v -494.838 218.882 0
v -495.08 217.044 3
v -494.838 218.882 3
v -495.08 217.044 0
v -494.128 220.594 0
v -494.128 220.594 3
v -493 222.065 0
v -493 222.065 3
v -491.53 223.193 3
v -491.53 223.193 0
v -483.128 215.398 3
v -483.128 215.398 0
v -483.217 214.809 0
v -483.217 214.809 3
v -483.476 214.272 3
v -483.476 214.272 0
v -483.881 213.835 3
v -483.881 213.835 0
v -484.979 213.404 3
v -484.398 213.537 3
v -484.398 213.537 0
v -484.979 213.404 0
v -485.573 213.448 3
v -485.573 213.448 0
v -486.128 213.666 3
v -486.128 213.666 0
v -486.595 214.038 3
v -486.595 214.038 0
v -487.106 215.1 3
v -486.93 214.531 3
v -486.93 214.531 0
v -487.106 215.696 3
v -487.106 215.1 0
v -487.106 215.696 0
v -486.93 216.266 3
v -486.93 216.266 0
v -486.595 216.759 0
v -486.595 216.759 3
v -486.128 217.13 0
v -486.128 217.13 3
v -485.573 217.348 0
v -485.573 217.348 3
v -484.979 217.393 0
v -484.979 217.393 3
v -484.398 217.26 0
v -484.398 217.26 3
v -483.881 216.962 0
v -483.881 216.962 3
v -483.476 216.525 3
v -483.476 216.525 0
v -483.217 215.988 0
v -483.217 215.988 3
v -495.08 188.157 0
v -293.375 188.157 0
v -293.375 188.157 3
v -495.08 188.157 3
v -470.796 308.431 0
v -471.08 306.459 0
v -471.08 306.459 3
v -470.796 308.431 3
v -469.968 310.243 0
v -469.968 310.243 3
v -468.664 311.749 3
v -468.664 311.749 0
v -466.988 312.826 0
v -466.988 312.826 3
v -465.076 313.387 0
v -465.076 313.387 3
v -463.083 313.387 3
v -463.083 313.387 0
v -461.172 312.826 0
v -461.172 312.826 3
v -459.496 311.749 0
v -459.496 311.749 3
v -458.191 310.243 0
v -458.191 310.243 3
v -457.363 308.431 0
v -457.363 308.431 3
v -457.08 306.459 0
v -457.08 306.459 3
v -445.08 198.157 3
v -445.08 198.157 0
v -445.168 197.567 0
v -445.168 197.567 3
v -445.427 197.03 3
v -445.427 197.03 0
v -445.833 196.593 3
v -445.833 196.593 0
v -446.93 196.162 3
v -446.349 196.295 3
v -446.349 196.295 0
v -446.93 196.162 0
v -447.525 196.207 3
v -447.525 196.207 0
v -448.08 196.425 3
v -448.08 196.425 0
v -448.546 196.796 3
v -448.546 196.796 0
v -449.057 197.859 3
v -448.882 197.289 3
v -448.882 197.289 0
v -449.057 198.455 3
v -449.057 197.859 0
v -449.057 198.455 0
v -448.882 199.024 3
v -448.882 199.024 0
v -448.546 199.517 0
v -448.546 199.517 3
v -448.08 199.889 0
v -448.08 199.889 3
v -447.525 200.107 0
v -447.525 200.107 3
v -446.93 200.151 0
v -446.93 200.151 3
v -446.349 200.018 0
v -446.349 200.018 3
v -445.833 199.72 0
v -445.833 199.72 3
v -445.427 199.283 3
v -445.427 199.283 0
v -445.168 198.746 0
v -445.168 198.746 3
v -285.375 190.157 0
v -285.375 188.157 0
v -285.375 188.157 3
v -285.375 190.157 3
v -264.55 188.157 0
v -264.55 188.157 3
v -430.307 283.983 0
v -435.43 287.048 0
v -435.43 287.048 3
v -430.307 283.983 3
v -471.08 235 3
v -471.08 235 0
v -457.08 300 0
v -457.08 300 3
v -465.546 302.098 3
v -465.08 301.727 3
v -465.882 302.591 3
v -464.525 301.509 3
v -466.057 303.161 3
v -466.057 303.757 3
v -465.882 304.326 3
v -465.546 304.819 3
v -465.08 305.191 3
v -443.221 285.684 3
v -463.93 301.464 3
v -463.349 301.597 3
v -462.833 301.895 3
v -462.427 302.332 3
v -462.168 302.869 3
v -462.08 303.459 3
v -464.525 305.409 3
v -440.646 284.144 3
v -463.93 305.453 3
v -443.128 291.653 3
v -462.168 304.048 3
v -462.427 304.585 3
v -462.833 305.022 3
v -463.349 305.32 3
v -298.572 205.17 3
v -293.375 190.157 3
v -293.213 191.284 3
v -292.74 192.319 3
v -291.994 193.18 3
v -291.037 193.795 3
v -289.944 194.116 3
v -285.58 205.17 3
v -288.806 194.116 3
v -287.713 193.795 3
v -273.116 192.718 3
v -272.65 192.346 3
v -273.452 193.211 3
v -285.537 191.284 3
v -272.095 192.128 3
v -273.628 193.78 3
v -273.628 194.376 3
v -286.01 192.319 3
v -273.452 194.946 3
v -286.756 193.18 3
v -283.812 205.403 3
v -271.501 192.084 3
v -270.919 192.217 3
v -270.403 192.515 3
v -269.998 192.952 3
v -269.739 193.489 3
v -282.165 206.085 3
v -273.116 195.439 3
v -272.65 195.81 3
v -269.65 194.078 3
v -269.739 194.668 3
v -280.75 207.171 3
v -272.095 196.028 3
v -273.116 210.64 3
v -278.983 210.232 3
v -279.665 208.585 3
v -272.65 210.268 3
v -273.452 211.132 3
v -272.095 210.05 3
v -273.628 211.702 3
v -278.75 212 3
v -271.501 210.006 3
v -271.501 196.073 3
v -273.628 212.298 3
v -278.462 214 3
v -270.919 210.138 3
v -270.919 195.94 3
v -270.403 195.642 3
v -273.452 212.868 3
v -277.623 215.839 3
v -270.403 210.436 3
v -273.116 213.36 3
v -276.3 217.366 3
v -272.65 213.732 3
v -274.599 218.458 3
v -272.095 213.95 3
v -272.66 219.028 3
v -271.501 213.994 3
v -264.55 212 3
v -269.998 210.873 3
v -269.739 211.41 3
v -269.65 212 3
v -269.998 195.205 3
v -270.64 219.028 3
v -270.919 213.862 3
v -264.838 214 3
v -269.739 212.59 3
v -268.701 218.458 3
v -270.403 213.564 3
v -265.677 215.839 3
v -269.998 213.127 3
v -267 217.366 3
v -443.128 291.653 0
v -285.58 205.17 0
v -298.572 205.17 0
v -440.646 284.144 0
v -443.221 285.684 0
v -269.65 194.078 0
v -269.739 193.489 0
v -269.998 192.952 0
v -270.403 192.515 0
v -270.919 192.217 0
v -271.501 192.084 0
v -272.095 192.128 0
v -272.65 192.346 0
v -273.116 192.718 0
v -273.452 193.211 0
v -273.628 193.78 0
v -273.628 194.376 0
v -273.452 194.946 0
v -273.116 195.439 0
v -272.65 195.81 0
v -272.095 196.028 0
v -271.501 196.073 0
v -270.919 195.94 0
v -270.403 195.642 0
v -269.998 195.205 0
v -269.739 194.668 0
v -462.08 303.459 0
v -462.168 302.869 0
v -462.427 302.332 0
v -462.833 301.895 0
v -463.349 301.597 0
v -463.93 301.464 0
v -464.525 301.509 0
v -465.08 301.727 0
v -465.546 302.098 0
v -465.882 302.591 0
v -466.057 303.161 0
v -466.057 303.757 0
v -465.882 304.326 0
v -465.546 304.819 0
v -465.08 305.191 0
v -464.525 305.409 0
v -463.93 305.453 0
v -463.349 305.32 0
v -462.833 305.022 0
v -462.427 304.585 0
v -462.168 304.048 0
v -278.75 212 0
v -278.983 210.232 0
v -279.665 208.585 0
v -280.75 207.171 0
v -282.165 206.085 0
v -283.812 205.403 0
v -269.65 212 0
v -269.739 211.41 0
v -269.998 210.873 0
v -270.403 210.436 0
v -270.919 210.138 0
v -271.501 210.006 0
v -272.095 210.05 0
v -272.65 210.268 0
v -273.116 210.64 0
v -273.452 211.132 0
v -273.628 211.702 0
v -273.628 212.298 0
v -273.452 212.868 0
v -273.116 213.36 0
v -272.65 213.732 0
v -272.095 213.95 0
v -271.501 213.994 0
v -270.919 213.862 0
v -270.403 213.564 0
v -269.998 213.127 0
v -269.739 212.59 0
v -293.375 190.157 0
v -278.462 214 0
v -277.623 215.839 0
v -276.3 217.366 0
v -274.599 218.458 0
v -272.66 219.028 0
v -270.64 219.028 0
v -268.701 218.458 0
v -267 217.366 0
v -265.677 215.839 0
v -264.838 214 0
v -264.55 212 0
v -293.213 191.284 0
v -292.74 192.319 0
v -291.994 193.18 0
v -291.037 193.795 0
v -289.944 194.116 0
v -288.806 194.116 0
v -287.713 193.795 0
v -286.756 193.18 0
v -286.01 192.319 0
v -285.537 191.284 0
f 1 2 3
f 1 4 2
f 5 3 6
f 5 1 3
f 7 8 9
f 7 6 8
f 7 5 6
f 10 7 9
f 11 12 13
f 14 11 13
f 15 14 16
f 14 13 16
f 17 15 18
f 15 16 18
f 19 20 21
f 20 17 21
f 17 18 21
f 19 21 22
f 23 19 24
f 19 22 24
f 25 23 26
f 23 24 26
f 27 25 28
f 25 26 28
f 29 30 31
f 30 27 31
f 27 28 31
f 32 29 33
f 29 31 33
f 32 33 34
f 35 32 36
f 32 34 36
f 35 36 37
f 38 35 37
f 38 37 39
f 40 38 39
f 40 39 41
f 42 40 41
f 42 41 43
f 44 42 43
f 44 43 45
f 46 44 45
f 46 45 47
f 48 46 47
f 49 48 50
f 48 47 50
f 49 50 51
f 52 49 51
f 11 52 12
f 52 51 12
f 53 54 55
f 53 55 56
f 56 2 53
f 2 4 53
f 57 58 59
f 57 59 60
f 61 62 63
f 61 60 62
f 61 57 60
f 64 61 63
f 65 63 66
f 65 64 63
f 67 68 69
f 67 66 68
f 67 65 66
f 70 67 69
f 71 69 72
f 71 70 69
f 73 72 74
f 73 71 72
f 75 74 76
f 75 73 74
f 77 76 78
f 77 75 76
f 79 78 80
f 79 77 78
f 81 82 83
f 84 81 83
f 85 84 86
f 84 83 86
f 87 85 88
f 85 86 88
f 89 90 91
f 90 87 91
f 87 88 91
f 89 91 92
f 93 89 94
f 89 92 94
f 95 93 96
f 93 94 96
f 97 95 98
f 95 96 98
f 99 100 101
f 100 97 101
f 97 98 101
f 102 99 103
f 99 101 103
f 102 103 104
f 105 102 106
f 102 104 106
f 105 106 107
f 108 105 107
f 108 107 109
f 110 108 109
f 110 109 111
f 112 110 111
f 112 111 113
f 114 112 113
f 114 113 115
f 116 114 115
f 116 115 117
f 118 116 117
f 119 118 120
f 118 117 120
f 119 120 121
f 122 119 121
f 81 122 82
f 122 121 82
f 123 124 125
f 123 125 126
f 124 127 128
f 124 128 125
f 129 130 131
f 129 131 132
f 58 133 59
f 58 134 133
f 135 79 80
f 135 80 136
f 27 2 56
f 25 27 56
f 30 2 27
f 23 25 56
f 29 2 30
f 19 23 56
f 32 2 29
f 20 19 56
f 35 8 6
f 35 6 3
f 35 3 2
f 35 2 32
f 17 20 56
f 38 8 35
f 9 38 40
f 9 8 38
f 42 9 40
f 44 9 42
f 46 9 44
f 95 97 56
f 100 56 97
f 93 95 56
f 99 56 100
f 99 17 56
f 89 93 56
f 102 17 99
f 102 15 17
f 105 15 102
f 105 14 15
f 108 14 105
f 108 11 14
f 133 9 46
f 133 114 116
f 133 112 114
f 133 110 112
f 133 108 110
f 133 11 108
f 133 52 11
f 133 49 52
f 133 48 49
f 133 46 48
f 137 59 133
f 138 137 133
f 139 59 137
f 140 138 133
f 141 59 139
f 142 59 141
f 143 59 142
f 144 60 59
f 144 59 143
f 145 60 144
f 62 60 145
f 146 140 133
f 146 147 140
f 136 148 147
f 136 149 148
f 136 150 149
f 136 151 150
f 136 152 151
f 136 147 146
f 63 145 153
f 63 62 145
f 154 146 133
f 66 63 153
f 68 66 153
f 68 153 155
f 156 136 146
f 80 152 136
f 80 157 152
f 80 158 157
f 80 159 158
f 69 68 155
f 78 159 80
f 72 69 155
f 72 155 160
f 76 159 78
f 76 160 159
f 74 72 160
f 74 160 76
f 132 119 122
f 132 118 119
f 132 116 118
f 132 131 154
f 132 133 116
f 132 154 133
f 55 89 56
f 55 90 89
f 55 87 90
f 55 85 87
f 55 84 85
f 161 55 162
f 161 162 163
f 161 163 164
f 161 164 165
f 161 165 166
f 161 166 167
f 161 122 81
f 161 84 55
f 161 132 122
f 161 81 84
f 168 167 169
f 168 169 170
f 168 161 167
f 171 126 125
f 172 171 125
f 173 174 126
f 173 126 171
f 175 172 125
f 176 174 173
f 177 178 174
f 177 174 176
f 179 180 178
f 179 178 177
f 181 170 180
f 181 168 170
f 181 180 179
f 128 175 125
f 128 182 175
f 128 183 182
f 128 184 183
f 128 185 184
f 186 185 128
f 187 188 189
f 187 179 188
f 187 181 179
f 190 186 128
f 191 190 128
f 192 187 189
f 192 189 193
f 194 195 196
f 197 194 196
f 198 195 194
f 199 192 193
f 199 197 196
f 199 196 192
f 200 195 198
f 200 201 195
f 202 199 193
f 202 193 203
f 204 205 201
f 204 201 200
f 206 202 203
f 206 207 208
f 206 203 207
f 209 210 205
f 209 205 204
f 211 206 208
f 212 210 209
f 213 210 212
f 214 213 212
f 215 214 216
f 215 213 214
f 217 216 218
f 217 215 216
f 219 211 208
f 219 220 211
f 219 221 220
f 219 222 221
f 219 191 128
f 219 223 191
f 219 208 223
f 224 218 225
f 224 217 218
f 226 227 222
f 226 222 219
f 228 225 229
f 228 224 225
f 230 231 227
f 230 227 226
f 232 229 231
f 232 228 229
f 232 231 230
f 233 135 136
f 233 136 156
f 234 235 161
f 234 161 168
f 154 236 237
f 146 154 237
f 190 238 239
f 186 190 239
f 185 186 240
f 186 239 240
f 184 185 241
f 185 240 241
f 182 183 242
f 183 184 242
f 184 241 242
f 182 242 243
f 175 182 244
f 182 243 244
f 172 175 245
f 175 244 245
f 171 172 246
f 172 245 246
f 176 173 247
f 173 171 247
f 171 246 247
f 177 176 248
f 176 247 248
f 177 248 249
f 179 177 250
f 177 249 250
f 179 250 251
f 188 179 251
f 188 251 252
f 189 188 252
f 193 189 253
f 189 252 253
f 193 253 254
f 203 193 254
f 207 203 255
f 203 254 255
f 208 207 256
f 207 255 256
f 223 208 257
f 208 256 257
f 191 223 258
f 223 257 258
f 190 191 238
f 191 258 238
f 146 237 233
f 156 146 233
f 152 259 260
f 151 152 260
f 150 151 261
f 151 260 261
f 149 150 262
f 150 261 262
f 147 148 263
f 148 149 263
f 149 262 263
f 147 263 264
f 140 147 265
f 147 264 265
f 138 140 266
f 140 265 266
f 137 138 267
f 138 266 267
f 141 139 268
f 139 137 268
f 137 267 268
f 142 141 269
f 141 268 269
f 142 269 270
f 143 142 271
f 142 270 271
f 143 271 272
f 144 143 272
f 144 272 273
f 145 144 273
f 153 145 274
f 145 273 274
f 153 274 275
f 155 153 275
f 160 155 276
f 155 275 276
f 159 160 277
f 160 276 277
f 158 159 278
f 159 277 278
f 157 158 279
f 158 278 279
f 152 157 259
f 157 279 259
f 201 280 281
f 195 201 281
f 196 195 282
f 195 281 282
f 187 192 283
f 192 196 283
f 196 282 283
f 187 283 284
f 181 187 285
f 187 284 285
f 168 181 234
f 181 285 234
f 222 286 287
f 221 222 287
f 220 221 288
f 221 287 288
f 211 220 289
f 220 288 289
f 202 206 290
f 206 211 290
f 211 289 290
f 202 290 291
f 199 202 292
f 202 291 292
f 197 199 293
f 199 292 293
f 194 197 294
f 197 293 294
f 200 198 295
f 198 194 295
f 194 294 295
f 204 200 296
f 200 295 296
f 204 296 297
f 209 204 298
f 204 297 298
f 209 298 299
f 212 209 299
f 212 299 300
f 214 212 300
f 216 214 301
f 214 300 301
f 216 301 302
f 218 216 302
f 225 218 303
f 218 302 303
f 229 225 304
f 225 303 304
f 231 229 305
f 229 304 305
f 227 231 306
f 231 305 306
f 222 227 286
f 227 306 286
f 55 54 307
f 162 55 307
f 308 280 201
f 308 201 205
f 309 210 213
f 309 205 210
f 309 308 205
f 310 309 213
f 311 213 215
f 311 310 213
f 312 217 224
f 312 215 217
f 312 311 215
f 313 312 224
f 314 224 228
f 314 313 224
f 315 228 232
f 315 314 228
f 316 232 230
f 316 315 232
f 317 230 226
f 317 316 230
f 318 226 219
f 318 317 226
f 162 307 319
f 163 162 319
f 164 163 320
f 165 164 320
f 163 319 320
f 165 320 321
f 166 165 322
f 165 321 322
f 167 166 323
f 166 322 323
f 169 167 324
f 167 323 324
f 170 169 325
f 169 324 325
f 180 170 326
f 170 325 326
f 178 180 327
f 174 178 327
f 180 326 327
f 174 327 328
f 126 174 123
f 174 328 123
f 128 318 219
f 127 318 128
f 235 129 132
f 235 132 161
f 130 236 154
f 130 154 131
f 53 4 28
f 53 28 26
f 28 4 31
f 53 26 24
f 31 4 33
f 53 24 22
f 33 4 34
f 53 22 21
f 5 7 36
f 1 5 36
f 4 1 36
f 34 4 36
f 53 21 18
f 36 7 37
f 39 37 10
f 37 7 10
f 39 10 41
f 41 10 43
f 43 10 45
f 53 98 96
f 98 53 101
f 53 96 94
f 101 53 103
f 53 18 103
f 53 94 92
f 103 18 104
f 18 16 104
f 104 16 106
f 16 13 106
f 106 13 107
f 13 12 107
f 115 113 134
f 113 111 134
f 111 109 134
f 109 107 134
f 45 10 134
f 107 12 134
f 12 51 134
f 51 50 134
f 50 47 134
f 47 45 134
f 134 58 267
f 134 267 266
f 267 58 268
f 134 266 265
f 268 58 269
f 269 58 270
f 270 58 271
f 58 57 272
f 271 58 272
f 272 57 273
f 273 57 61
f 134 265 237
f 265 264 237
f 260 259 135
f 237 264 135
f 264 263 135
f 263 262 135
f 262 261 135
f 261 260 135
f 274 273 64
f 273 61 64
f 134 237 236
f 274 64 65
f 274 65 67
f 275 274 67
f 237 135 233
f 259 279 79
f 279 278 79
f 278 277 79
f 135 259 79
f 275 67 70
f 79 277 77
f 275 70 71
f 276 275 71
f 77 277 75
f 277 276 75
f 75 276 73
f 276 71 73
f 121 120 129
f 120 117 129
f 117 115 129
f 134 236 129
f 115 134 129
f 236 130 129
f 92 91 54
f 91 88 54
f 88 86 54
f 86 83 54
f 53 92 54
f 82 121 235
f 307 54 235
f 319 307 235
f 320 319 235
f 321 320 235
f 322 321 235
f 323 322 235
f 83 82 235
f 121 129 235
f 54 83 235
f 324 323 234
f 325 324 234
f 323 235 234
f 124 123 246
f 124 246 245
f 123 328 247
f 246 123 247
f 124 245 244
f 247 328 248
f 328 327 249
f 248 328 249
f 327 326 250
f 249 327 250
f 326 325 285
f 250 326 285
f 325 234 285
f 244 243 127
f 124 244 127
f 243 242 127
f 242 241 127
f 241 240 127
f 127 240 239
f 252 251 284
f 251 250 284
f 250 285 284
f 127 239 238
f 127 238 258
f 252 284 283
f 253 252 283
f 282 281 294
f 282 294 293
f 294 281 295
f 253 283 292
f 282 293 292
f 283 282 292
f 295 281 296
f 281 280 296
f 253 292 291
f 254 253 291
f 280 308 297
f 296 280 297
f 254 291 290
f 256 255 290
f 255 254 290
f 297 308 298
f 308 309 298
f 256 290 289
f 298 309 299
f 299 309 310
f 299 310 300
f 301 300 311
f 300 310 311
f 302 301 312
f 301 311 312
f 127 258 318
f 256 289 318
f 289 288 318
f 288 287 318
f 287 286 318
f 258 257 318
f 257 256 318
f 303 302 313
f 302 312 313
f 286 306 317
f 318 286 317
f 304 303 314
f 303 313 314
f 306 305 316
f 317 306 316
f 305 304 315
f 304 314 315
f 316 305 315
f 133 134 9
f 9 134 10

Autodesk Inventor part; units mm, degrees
ref_plane "YZ Plane" through (0, 0, 0) normal (1, 0, 0) x (0, 1, 0)
ref_plane "XZ Plane" through (0, 0, 0) normal (0, 1, 0) x (-1, 0, 0)
ref_plane "XY Plane" through (0, 0, 0) normal (0, 0, 1) x (1, 0, 0)
sketch "Sketch3" plane through (0, 0, 0) normal (0, 0, 1) x (1, 0, 0)
  circle A0 centre (367.816, 50) radius 50 construction
  line L0 (367.816, 0) -> (512.7041, 0) construction
  line L1 (367.816, 50) -> (512.7041, 50) construction
  line L2 (367.816, 100) -> (512.7041, 100) construction
  line L3 (367.816, 50) -> (342.816, 6.6987) construction
  line L4 (367.816, 50) -> (324.5147, 25) construction
  line L5 (367.816, 50) -> (324.5147, 75) construction
  line L6 (342.816, 93.3013) -> (367.816, 50) construction
  line L7 (392.816, 93.3013) -> (367.816, 50) construction
  line L8 (411.1173, 75) -> (367.816, 50) construction
  line L9 (411.1173, 25) -> (367.816, 50) construction
  line L10 (392.816, 6.6987) -> (367.816, 50) construction
  line L11 (367.816, 0) -> (367.816, 100) construction
  line L12 (417.816, 50) -> (367.816, 50) construction
  line L13 (341.6361, 0) -> (341.6361, 100) construction
  line L14 (315.4561, 0) -> (315.4561, 100) construction
  line L15 (289.2762, 0) -> (289.2762, 100) construction
  line L16 (263.0963, 0) -> (263.0963, 100) construction
  line L17 (236.9163, 0) -> (236.9163, 100) construction
  line L18 (210.7364, 0) -> (210.7364, 100) construction
  line L19 (184.5564, 0) -> (184.5564, 100) construction
  line L20 (158.3765, 0) -> (158.3765, 100) construction
  circle A1 centre (315.4561, 50) radius 50 construction
  circle A2 centre (341.6361, 50) radius 50 construction
  circle A3 centre (289.2762, 50) radius 50 construction
  circle A4 centre (263.0963, 50) radius 50 construction
  circle A5 centre (236.9163, 50) radius 50 construction
  circle A6 centre (210.7364, 50) radius 50 construction
  line L21 (392.816, 6.6987) -> (512.7041, 6.6987) construction
  line L22 (411.1173, 25) -> (512.7041, 25) construction
  line L23 (411.1173, 75) -> (512.7041, 75) construction
  line L24 (411.1173, 75) -> (512.7041, 75) construction
  line L25 (392.816, 93.3013) -> (512.7041, 93.3013) construction
  line L26 (358.7574, 75) -> (339.2762, 50) construction
  line L27 (339.2762, 50) -> (306.3975, 25) construction
  line L28 (306.3975, 25) -> (261.9163, 6.6987) construction
  line L29 (261.9163, 6.6987) -> (210.7364, 0) construction
  line L30 (105.3682, -12.9392) -> (105.3682, 124.4333) construction
  line L31 (21.25, 0) -> (21.25, 12)
  line L32 (35.45, 12) -> (35.45, -11.8433)
  arc A7 (0, 0) -> (6.625, -9.8433) centre (10.625, 0) ccw
  arc A8 (14.625, -9.8433) -> (21.25, 0) centre (10.625, 0) ccw
  line L33 (35.45, -11.8433) -> (14.625, -11.8433)
  line L34 (6.625, -11.8433) -> (-195.0796, -11.8433)
  circle A9 centre (-144.26, 100.8473) radius 12.875 construction
  line L35 (6.625, -11.8433) -> (6.625, -9.8433)
  line L36 (14.625, -11.8433) -> (14.625, -9.8433)
  line L37 (411.1173, 75) -> (158.3765, 75) construction
  line L38 (367.816, 100) -> (158.3765, 100) construction
  line L39 (417.816, 50) -> (158.3765, 50) construction
  line L40 (411.1173, 25) -> (158.3765, 25) construction
  line L41 (392.816, 6.6987) -> (158.3765, 6.6987) construction
  line L42 (392.816, 93.3013) -> (158.3765, 93.3013) construction
  line L43 (358.7574, 75) -> (366.6361, 93.3013) construction
  line L44 (366.6361, 93.3013) -> (367.816, 100) construction
  spline S0 degree 4 poles (-157.0796, 100) (-157.0796, 88.9946) (-147.011, 72.6811) (-131.8577, 48.7932) (-88.4777, 17.6268) (-50.0176, 3.937) (-18.8717, 0) (0, 0) knots 0 0 0 0 0 0.264547 0.457223 0.66608 1 1 1 1 1
  line L45 (-157.0796, 100) -> (-157.0796, 38) construction
  line L46 (0, 0) -> (-157.0796, 0) construction
  line L47 (-144.26, 100.8473) -> (-157.135, 100.8473) construction
  circle A10 centre (-146.4546, 100) radius 10.625 construction
  line L48 (-146.4546, 100) -> (-157.0796, 100) construction
  line L49 (-141.0754, 84.4005) -> (-135.6205, 93.5183) construction
  line L50 (-141.0796, 132.0528) -> (-171.0796, 149.3733) construction
  line L51 (-171.0796, 149.3733) -> (-201.0796, 132.0528) construction
  line L52 (-141.0754, 84.4005) -> (-99.2801, 84.4005) construction
  line L53 (-201.0796, 132.0528) -> (-201.0796, 97.4118) construction
  line L54 (-201.0796, 97.4118) -> (-171.0796, 80.0913) construction
  line L55 (0, 0) -> (-157.0796, 93.9753) construction
  line L56 (-135.6205, 93.5183) -> (-137.3368, 94.5451) construction
  line L57 (-137.3368, 94.5451) -> (-143.2815, 84.6085) construction
  line L58 (-137.3368, 94.5451) -> (-171.0796, 114.7323) construction
  line L59 (-201.0796, 132.0528) -> (-171.0796, 114.7323) construction
  arc A11 (-137.3368, 94.5451) -> (-144.7045, 143.8948) centre (-171.0796, 114.7323) ccw construction
  arc A12 (-142.7917, 85.4273) -> (-147.1443, 147.6882) centre (-171.0796, 114.7323) ccw construction
  line L60 (-171.0796, 80.0913) -> (-171.0796, 35)
  circle A13 centre (-171.0796, 114.7323) radius 2.5 construction
  arc A14 (-167.4345, 120.8251) -> (-174.7248, 108.6394) centre (-171.0796, 114.7323) ccw construction
  line L61 (-167.4345, 120.8251) -> (-157.0796, 114.6302) construction
  line L62 (-171.0796, 80.0913) -> (-171.0796, 106.4587)
  line L63 (-171.0796, 106.4587) -> (-174.7248, 108.6394) construction
  line L64 (-171.0796, 35) -> (-191.5296, 23.1932)
  arc A15 (-191.5296, 23.1932) -> (-195.0796, 17.0444) centre (-187.9796, 17.0444) ccw
  line L65 (-195.0796, 17.0444) -> (-195.0796, -11.8433)
  arc A16 (35.45, 12) -> (21.25, 12) centre (28.35, 12) ccw
  line L66 (-157.0796, 114.6302) -> (-157.0796, 99.9865) construction
  circle A17 centre (-164.0796, 103.4587) radius 2
  line L67 (-171.0796, 103.4587) -> (-157.0796, 103.4587) construction
  circle A18 centre (-185.1284, 15.3983) radius 2
  line L68 (-185.1284, 15.3983) -> (-194.1284, 20.5944) construction
  circle A19 centre (-6, -5.9217) radius 2
  line L69 (-6, -11.8433) -> (-6, 0) construction
  circle A20 centre (28.35, 12) radius 2
  circle A21 centre (28.35, -5.9217) radius 2
  line L70 (-167.4345, 320.8251) -> (-157.0796, 314.6302) construction
  arc A22 (-167.4345, 320.8251) -> (-174.7248, 308.6394) centre (-171.0796, 314.7323) ccw construction
  circle A23 centre (-171.0796, 314.7323) radius 2.5 construction
  line L71 (-171.0796, 280.0913) -> (-171.0796, 306.4587)
  line L72 (-171.0796, 306.4587) -> (-174.7248, 308.6394) construction
  line L73 (-157.0796, 314.6302) -> (-157.0796, 299.9865) construction
  circle A24 centre (-164.0796, 303.4587) radius 2
  spline S1 degree 4 poles (-157.0796, 300) (-157.0796, 288.9946) (-147.0234, 272.6841) (-124.1789, 236.7977) (-70.8039, 208.0704) (-31.8865, 200.2943) (0, 200) knots 0 0 0 0 0 0.264547 0.457223 1 1 1 1 1 construction
  line L74 (-157.0796, 300) -> (-157.0796, 238) construction
  arc A25 (0, 200) -> (6.625, 190.1567) centre (10.625, 200) ccw
  line L75 (35.45, 212) -> (35.45, 188.1567)
  circle A26 centre (28.35, 212) radius 2
  circle A27 centre (28.35, 194.0783) radius 2
  arc A28 (35.45, 212) -> (21.25, 212) centre (28.35, 212) ccw
  line L76 (21.25, 200) -> (21.25, 212)
  line L77 (35.45, 188.1567) -> (14.625, 188.1567)
  arc A29 (14.625, 190.1567) -> (21.25, 200) centre (10.625, 200) ccw
  line L78 (14.625, 188.1567) -> (14.625, 190.1567)
  line L79 (-185.1284, 215.3983) -> (-194.1284, 220.5944) construction
  arc A30 (-191.5296, 223.1932) -> (-195.0796, 217.0444) centre (-187.9796, 217.0444) ccw
  line L80 (-195.0796, 217.0444) -> (-195.0796, 188.1567)
  line L81 (-171.0796, 235) -> (-191.5296, 223.1932)
  circle A31 centre (-185.1284, 215.3983) radius 2
  line L82 (-171.0796, 280.0913) -> (-171.0796, 235)
  line L83 (6.625, 188.1567) -> (-195.0796, 188.1567)
  line L84 (6.625, 188.1567) -> (6.625, 190.1567)
  line L85 (-137.3368, 294.5451) -> (-143.2815, 284.6085) construction
  line L86 (-141.0754, 284.4005) -> (-135.6205, 293.5183) construction
  line L87 (0, 200) -> (-157.0796, 293.9753)
  line L88 (-167.4345, 520.8251) -> (-157.0796, 514.6302) construction
  arc A32 (-167.4345, 520.8251) -> (-174.7248, 508.6394) centre (-171.0796, 514.7323) ccw construction
  circle A33 centre (-171.0796, 514.7323) radius 2.5 construction
  line L89 (-171.0796, 480.0913) -> (-171.0796, 506.4587)
  line L90 (-171.0796, 506.4587) -> (-174.7248, 508.6394) construction
  line L91 (-157.0796, 514.6302) -> (-157.0796, 499.9865) construction
  circle A34 centre (-164.0796, 503.4587) radius 2
  spline S2 degree 4 poles (-157.0796, 500) (-157.0796, 488.9946) (-147.0234, 472.6841) (-124.1789, 436.7977) (-70.8039, 408.0704) (-31.8865, 400.2943) (0, 400) knots 0 0 0 0 0 0.264547 0.457223 1 1 1 1 1 construction
  line L92 (-157.0796, 500) -> (-157.0796, 438)
  arc A35 (0, 400) -> (6.625, 390.1567) centre (10.625, 400) ccw
  line L93 (35.45, 412) -> (35.45, 388.1567)
  circle A36 centre (28.35, 412) radius 2
  circle A37 centre (28.35, 394.0783) radius 2
  arc A38 (35.45, 412) -> (21.25, 412) centre (28.35, 412) ccw
  line L94 (21.25, 400) -> (21.25, 412)
  line L95 (35.45, 388.1567) -> (14.625, 388.1567)
  arc A39 (14.625, 390.1567) -> (21.25, 400) centre (10.625, 400) ccw
  line L96 (14.625, 388.1567) -> (14.625, 390.1567)
  line L97 (-185.1284, 415.3983) -> (-194.1284, 420.5944) construction
  arc A40 (-191.5296, 423.1932) -> (-195.0796, 417.0444) centre (-187.9796, 417.0444) ccw
  line L98 (-195.0796, 417.0444) -> (-195.0796, 388.1567)
  line L99 (-171.0796, 435) -> (-191.5296, 423.1932)
  circle A41 centre (-185.1284, 415.3983) radius 2
  line L100 (-171.0796, 480.0913) -> (-171.0796, 435)
  line L101 (6.625, 388.1567) -> (-195.0796, 388.1567)
  line L102 (6.625, 388.1567) -> (6.625, 390.1567)
  line L103 (-137.3368, 494.5451) -> (-143.2815, 484.6085) construction
  line L104 (-141.0754, 484.4005) -> (-135.6205, 493.5183) construction
  line L105 (0, 400) -> (-157.0796, 493.9753) construction
  line L106 (-467.4345, 120.8251) -> (-457.0796, 114.6302) construction
  arc A42 (-467.4345, 120.8251) -> (-474.7248, 108.6394) centre (-471.0796, 114.7323) ccw construction
  circle A43 centre (-471.0796, 114.7323) radius 2.5 construction
  line L107 (-471.0796, 80.0913) -> (-471.0796, 106.4587)
  line L108 (-471.0796, 106.4587) -> (-474.7248, 108.6394) construction
  line L109 (-457.0796, 114.6302) -> (-457.0796, 99.9865) construction
  circle A44 centre (-464.0796, 103.4587) radius 2
  spline S3 degree 4 poles (-457.0796, 100) (-457.0796, 88.9946) (-447.0234, 72.6841) (-424.1789, 36.7977) (-370.8039, 8.0704) (-331.8865, 0.2943) (-300, 0) knots 0 0 0 0 0 0.264547 0.457223 1 1 1 1 1 construction
  line L110 (-457.0796, 100) -> (-457.0796, 38) construction
  arc A45 (-300, 0) -> (-293.375, -9.8433) centre (-289.375, 0) ccw construction
  line L111 (-264.55, 12) -> (-264.55, -11.8433)
  circle A46 centre (-271.65, 12) radius 2
  circle A47 centre (-271.65, -5.9217) radius 2
  arc A48 (-264.55, 12) -> (-278.75, 12) centre (-271.65, 12) ccw
  line L112 (-278.75, 0) -> (-278.75, 12) construction
  line L113 (-264.55, -11.8433) -> (-285.375, -11.8433)
  arc A49 (-285.375, -9.8433) -> (-278.75, 0) centre (-289.375, 0) ccw construction
  line L114 (-285.375, -11.8433) -> (-285.375, -9.8433) construction
  line L115 (-485.1284, 15.3983) -> (-494.1284, 20.5944) construction
  arc A50 (-491.5296, 23.1932) -> (-495.0796, 17.0444) centre (-487.9796, 17.0444) ccw
  line L116 (-495.0796, 17.0444) -> (-495.0796, -11.8433)
  line L117 (-471.0796, 35) -> (-491.5296, 23.1932)
  circle A51 centre (-485.1284, 15.3983) radius 2
  line L118 (-471.0796, 80.0913) -> (-471.0796, 35)
  line L119 (-293.375, -11.8433) -> (-495.0796, -11.8433)
  line L120 (-293.375, -11.8433) -> (-293.375, -9.8433) construction
  line L121 (-437.3368, 94.5451) -> (-443.2815, 84.6085) construction
  line L122 (-441.0754, 84.4005) -> (-435.6205, 93.5183) construction
  line L123 (-300, 0) -> (-457.0796, 93.9753) construction
  line L124 (-467.4345, 320.8251) -> (-457.0796, 314.6302) construction
  arc A52 (-467.4345, 320.8251) -> (-474.7248, 308.6394) centre (-471.0796, 314.7323) ccw construction
  circle A53 centre (-471.0796, 314.7323) radius 2.5 construction
  line L125 (-471.0796, 280.0913) -> (-471.0796, 306.4587)
  line L126 (-471.0796, 306.4587) -> (-474.7248, 308.6394) construction
  line L127 (-457.0796, 314.6302) -> (-457.0796, 299.9865) construction
  circle A54 centre (-464.0796, 303.4587) radius 2
  spline S4 degree 4 poles (-457.0796, 300) (-457.0796, 288.9946) (-447.0234, 272.6841) (-424.1789, 236.7977) (-370.8039, 208.0704) (-331.8865, 200.2943) (-300, 200) knots 0 0 0 0 0 0.264547 0.457223 1 1 1 1 1 construction
  line L128 (-457.0796, 300) -> (-457.0796, 238) construction
  arc A55 (-300, 200) -> (-293.375, 190.1567) centre (-289.375, 200) ccw construction
  line L129 (-264.55, 212) -> (-264.55, 188.1567)
  circle A56 centre (-271.65, 212) radius 2
  circle A57 centre (-271.65, 194.0783) radius 2
  arc A58 (-264.55, 212) -> (-278.75, 212) centre (-271.65, 212) ccw
  line L130 (-278.75, 200) -> (-278.75, 212) construction
  line L131 (-264.55, 188.1567) -> (-285.375, 188.1567)
  arc A59 (-285.375, 190.1567) -> (-278.75, 200) centre (-289.375, 200) ccw construction
  line L132 (-285.375, 188.1567) -> (-285.375, 190.1567) construction
  line L133 (-485.1284, 215.3983) -> (-494.1284, 220.5944) construction
  arc A60 (-491.5296, 223.1932) -> (-495.0796, 217.0444) centre (-487.9796, 217.0444) ccw
  line L134 (-495.0796, 217.0444) -> (-495.0796, 188.1567)
  line L135 (-471.0796, 235) -> (-491.5296, 223.1932)
  circle A61 centre (-485.1284, 215.3983) radius 2
  line L136 (-471.0796, 280.0913) -> (-471.0796, 235)
  line L137 (-293.375, 188.1567) -> (-495.0796, 188.1567)
  line L138 (-293.375, 188.1567) -> (-293.375, 190.1567) construction
  line L139 (-437.3368, 294.5451) -> (-443.2815, 284.6085) construction
  line L140 (-441.0754, 284.4005) -> (-435.6205, 293.5183) construction
  line L141 (-300, 200) -> (-457.0796, 293.9753) construction
  line L142 (-467.4345, 520.8251) -> (-457.0796, 514.6302)
  arc A62 (-467.4345, 520.8251) -> (-474.7248, 508.6394) centre (-471.0796, 514.7323) ccw
  circle A63 centre (-471.0796, 514.7323) radius 2.5
  line L143 (-471.0796, 480.0913) -> (-471.0796, 506.4587)
  line L144 (-471.0796, 506.4587) -> (-474.7248, 508.6394)
  line L145 (-457.0796, 514.6302) -> (-457.0796, 499.9865)
  circle A64 centre (-464.0796, 503.4587) radius 2
  spline S5 degree 4 poles (-457.0796, 500) (-457.0796, 488.9946) (-447.0234, 472.6841) (-424.1789, 436.7977) (-370.8039, 408.0704) (-331.8865, 400.2943) (-300, 400) knots 0 0 0 0 0 0.264547 0.457223 1 1 1 1 1 construction
  line L146 (-457.0796, 500) -> (-457.0796, 438) construction
  arc A65 (-300, 400) -> (-293.375, 390.1567) centre (-289.375, 400) ccw construction
  line L147 (-264.55, 412) -> (-264.55, 388.1567) construction
  circle A66 centre (-271.65, 412) radius 2
  circle A67 centre (-271.65, 394.0783) radius 2
  arc A68 (-264.55, 412) -> (-278.75, 412) centre (-271.65, 412) ccw
  line L148 (-278.75, 400) -> (-278.75, 412) construction
  line L149 (-264.55, 388.1567) -> (-285.375, 388.1567)
  arc A69 (-285.375, 390.1567) -> (-278.75, 400) centre (-289.375, 400) ccw construction
  line L150 (-285.375, 388.1567) -> (-285.375, 390.1567) construction
  line L151 (-485.1284, 415.3983) -> (-494.1284, 420.5944) construction
  arc A70 (-491.5296, 423.1932) -> (-495.0796, 417.0444) centre (-487.9796, 417.0444) ccw
  line L152 (-495.0796, 417.0444) -> (-495.0796, 388.1567) construction
  line L153 (-471.0796, 435) -> (-491.5296, 423.1932)
  circle A71 centre (-485.1284, 415.3983) radius 2
  line L154 (-471.0796, 480.0913) -> (-471.0796, 435)
  line L155 (-293.375, 388.1567) -> (-495.0796, 388.1567)
  line L156 (-293.375, 388.1567) -> (-293.375, 390.1567) construction
  line L157 (-437.3368, 494.5451) -> (-443.2815, 484.6085) construction
  line L158 (-441.0754, 484.4005) -> (-435.6205, 493.5183) construction
  line L159 (-300, 400) -> (-457.0796, 493.9753) construction
  line L160 (-435.4304, 87.048) -> (-430.3073, 83.9831)
  line L161 (-430.3073, 83.9831) -> (-430.3073, 78.0131)
  line L162 (-457.0796, 100) -> (-443.128, 91.6532)
  line L163 (-443.2208, 85.684) -> (-443.128, 91.6532)
  line L164 (-440.6463, 84.1438) -> (-435.4304, 87.048)
  line L165 (-440.6463, 84.1438) -> (-443.2208, 85.684)
  line L166 (-430.3073, 78.0131) -> (-436.0283, 74.7101)
  line L167 (-436.0283, 74.7101) -> (-436.0283, 68.1041)
  spline S6 degree 4 poles (-439.3753, 72.7777) (-420.1522, 45.3403) (-398.6357, 22.4496) (-337.1208, 4.2654) (-300, 5.1701) knots 0 0 0 0 0 1 1 1 1 1
  line L168 (-293.375, -11.8433) -> (-285.375, -11.8433)
  line L169 (-157.0796, 293.9753) -> (-157.0796, 300)
  line L170 (-293.375, 188.1567) -> (-285.375, 188.1567)
  arc A72 (-157.0796, 438) -> (-119.0796, 400) centre (-119.0796, 438) ccw
  line L171 (-119.0796, 400) -> (0, 400)
  line L172 (-457.0796, 500) -> (-457.0796, 438) construction
  line L173 (-419.0796, 400) -> (-300, 400) construction
  arc A73 (-457.0796, 438) -> (-419.0796, 400) centre (-419.0796, 438) ccw construction
  line L174 (-457.0796, 300) -> (-443.128, 291.6532)
  line L175 (-443.2208, 285.684) -> (-443.128, 291.6532)
  line L176 (-440.6463, 284.1438) -> (-443.2208, 285.684)
  line L177 (-440.6463, 284.1438) -> (-435.4304, 287.048)
  line L178 (-435.4304, 287.048) -> (-430.3073, 283.9831)
  line L179 (-430.3073, 283.9831) -> (-430.3073, 278.0131) construction
  line L180 (-430.3073, 278.0131) -> (-436.0283, 274.7101) construction
  line L181 (-457.0796, 500) -> (-443.128, 491.6532)
  line L182 (-443.2208, 485.684) -> (-443.128, 491.6532)
  line L183 (-440.6463, 484.1438) -> (-443.2208, 485.684)
  line L184 (-440.6463, 484.1438) -> (-435.4304, 487.048)
  line L185 (-435.4304, 487.048) -> (-430.3073, 483.9831)
  line L186 (-430.3073, 483.9831) -> (-430.3073, 478.0131)
  line L187 (-430.3073, 478.0131) -> (-436.0283, 474.7101)
  line L188 (-430.3073, 283.9831) -> (-298.5715, 205.1701)
  line L189 (-293.375, 388.1567) -> (-285.375, 388.1567)
  line L190 (-300, 5.1701) -> (-285.5799, 5.1701)
  arc A74 (-285.5799, 5.1701) -> (-278.75, 12) centre (-285.5799, 12) ccw
  line L191 (-298.5715, 205.1701) -> (-285.5799, 205.1701)
  arc A75 (-285.5799, 205.1701) -> (-278.75, 212) centre (-285.5799, 212) ccw
  line L192 (-436.0283, 474.7101) -> (-451.9095, 465.5411)
  line L193 (-451.9095, 465.5411) -> (-451.9095, 438)
  arc A76 (-451.9095, 438) -> (-419.0796, 405.1701) centre (-419.0796, 438) ccw
  line L194 (-419.0796, 405.1701) -> (-285.5799, 405.1701)
  arc A77 (-285.5799, 405.1701) -> (-278.75, 412) centre (-285.5799, 412) ccw
  line L195 (-495.0796, 388.1567) -> (-514.2796, 388.1567)
  line L196 (-514.2796, 388.1567) -> (-514.2796, 392.1567)
  line L197 (-514.2796, 392.1567) -> (-498.0796, 392.1567)
  arc A78 (-498.0796, 392.1567) -> (-495.0796, 395.1567) centre (-498.0796, 395.1567) ccw
  line L198 (-495.0796, 395.1567) -> (-495.0796, 417.0444)
  line L199 (-499.0796, 388.1567) -> (-510.2796, 388.1567) construction
  line L200 (-510.2796, 388.1567) -> (-510.2796, 392.1567) construction
  line L201 (-510.2796, 392.1567) -> (-499.0796, 392.1567) construction
  line L202 (-499.0796, 392.1567) -> (-499.0796, 388.1567) construction
  line L203 (-499.0796, 388.1567) -> (-510.2796, 392.1567) construction
  line L204 (-510.2796, 388.1567) -> (-499.0796, 392.1567) construction
  arc A79 (-600, 200) -> (-593.375, 190.1567) centre (-589.375, 200) ccw construction
  line L205 (-564.55, 212) -> (-564.55, 188.1567) construction
  circle A80 centre (-571.65, 212) radius 2
  circle A81 centre (-571.65, 194.0783) radius 2
  arc A82 (-564.55, 212) -> (-578.75, 212) centre (-571.65, 212) ccw
  line L206 (-578.75, 200) -> (-578.75, 212) construction
  line L207 (-564.55, 188.1567) -> (-585.375, 188.1567)
  arc A83 (-585.375, 190.1567) -> (-578.75, 200) centre (-589.375, 200) ccw construction
  line L208 (-585.375, 188.1567) -> (-585.375, 190.1567) construction
  line L209 (-593.375, 188.1567) -> (-593.375, 190.1567) construction
  arc A84 (-585.5799, 205.1701) -> (-578.75, 212) centre (-585.5799, 212) ccw
  line L210 (-593.375, 188.1567) -> (-585.375, 188.1567)
  line L211 (-598.5715, 205.1701) -> (-585.5799, 205.1701)
  arc A85 (-791.5296, 223.1932) -> (-795.0796, 217.0444) centre (-787.9796, 217.0444) ccw
  line L212 (-785.1284, 215.3983) -> (-794.1284, 220.5944) construction
  circle A86 centre (-785.1284, 215.3983) radius 2
  line L213 (-771.0796, 235) -> (-791.5296, 223.1932)
  line L214 (-795.0796, 217.0444) -> (-795.0796, 188.1567) construction
  line L215 (-730.3073, 278.0131) -> (-736.0283, 274.7101) construction
  line L216 (-757.0796, 300) -> (-757.0796, 238) construction
  line L217 (-730.3073, 283.9831) -> (-730.3073, 278.0131) construction
  line L218 (-730.3073, 283.9831) -> (-598.5715, 205.1701)
  line L219 (-600, 200) -> (-757.0796, 293.9753) construction
  spline S7 degree 4 poles (-757.0796, 300) (-757.0796, 288.9946) (-747.0234, 272.6841) (-724.1789, 236.7977) (-670.8039, 208.0704) (-631.8865, 200.2943) (-600, 200) knots 0 0 0 0 0 0.264547 0.457223 1 1 1 1 1 construction
  line L220 (-593.375, 188.1567) -> (-795.0796, 188.1567)
  line L221 (-771.0796, 280.0913) -> (-771.0796, 235)
  line L222 (-757.0796, 300) -> (-743.128, 291.6532)
  line L223 (-743.2208, 285.684) -> (-743.128, 291.6532)
  line L224 (-740.6463, 284.1438) -> (-743.2208, 285.684)
  line L225 (-737.3368, 294.5451) -> (-743.2815, 284.6085) construction
  line L226 (-741.0754, 284.4005) -> (-735.6205, 293.5183) construction
  line L227 (-740.6463, 284.1438) -> (-735.4304, 287.048)
  line L228 (-735.4304, 287.048) -> (-730.3073, 283.9831)
  line L229 (-767.4345, 320.8251) -> (-757.0796, 314.6302)
  line L230 (-771.0796, 280.0913) -> (-771.0796, 306.4587)
  line L231 (-757.0796, 314.6302) -> (-757.0796, 299.9865)
  circle A87 centre (-764.0796, 303.4587) radius 2
  line L232 (-771.0796, 306.4587) -> (-774.7248, 308.6394)
  circle A88 centre (-771.0796, 314.7323) radius 2.5
  arc A89 (-767.4345, 320.8251) -> (-774.7248, 308.6394) centre (-771.0796, 314.7323) ccw
  line L233 (-795.0796, 188.1567) -> (-814.2796, 188.1567)
  line L234 (-814.2796, 188.1567) -> (-814.2796, 192.1567)
  line L235 (-814.2796, 192.1567) -> (-798.0796, 192.1567)
  arc A90 (-798.0796, 192.1567) -> (-795.0796, 195.1567) centre (-798.0796, 195.1567) ccw
  line L236 (-795.0796, 195.1567) -> (-795.0796, 217.0444)
  line L237 (-799.0796, 188.1567) -> (-810.2796, 188.1567) construction
  line L238 (-810.2796, 188.1567) -> (-810.2796, 192.1567) construction
  line L239 (-810.2796, 192.1567) -> (-799.0796, 192.1567) construction
  line L240 (-799.0796, 192.1567) -> (-799.0796, 188.1567) construction
  line L241 (-799.0796, 188.1567) -> (-810.2796, 192.1567) construction
  line L242 (-810.2796, 188.1567) -> (-799.0796, 192.1567) construction
  line L243 (-495.0796, 587.6927) -> (-264.55, 587.6927) construction
  line L244 (-379.8148, 587.6927) -> (-379.8148, 614.3146) construction
  line L245 (-795.0796, 438) -> (-564.55, 438) construction
  line L246 (-679.8148, 438) -> (-679.8148, 492.8294) construction
  arc A91 (-564.55, 195.1567) -> (-561.55, 192.1567) centre (-561.55, 195.1567) ccw
  line L247 (-545.35, 192.1567) -> (-561.55, 192.1567)
  line L248 (-545.35, 188.1567) -> (-545.35, 192.1567)
  line L249 (-560.55, 192.1567) -> (-560.55, 188.1567) construction
  line L250 (-560.55, 188.1567) -> (-549.35, 188.1567) construction
  line L251 (-564.55, 188.1567) -> (-545.35, 188.1567)
  line L252 (-549.35, 188.1567) -> (-549.35, 192.1567) construction
  line L253 (-549.35, 192.1567) -> (-560.55, 192.1567) construction
  line L254 (-560.55, 188.1567) -> (-549.35, 192.1567) construction
  line L255 (-549.35, 188.1567) -> (-560.55, 192.1567) construction
  line L256 (-564.55, 195.1567) -> (-564.55, 212)
  circle A92 centre (-147.0796, 398.1567) radius 2
  circle A93 centre (-147.0796, 198.1567) radius 2
  circle A94 centre (-147.0796, -1.8433) radius 2
  circle A95 centre (-447.0796, 398.1567) radius 2
  circle A96 centre (-447.0796, 198.1567) radius 2
  circle A97 centre (-447.0796, -1.8433) radius 2
  circle A98 centre (-747.0796, 398.1567) radius 2 construction
  circle A99 centre (-747.0796, 198.1567) radius 2
  circle A100 centre (-747.0796, -1.8433) radius 2 construction
  line L257 (-264.55, 388.1567) -> (-245.35, 388.1567)
  line L258 (-245.35, 388.1567) -> (-245.35, 392.1567)
  line L259 (-245.35, 392.1567) -> (-261.55, 392.1567)
  arc A101 (-264.55, 395.1567) -> (-261.55, 392.1567) centre (-261.55, 395.1567) ccw
  line L260 (-260.55, 388.1567) -> (-249.35, 388.1567) construction
  line L261 (-249.35, 388.1567) -> (-249.35, 392.1567) construction
  line L262 (-249.35, 392.1567) -> (-260.55, 392.1567) construction
  line L263 (-260.55, 392.1567) -> (-260.55, 388.1567) construction
  line L264 (-260.55, 388.1567) -> (-249.35, 392.1567) construction
  line L265 (-249.35, 388.1567) -> (-260.55, 392.1567) construction
  line L266 (-264.55, 412) -> (-264.55, 395.1567)
  arc A102 (-157.0796, 106.4587) -> (-171.0796, 106.4587) centre (-164.0796, 106.4587) ccw
  line L267 (-157.0796, 106.4587) -> (-157.0796, 100)
  arc A103 (-157.0796, 306.4587) -> (-171.0796, 306.4587) centre (-164.0796, 306.4587) ccw
  line L268 (-157.0796, 306.4587) -> (-157.0796, 300)
  arc A104 (-157.0796, 506.4587) -> (-171.0796, 506.4587) centre (-164.0796, 506.4587) ccw
  line L269 (-157.0796, 506.4587) -> (-157.0796, 500)
  arc A105 (-457.0796, 106.4587) -> (-471.0796, 106.4587) centre (-464.0796, 106.4587) ccw
  line L270 (-457.0796, 106.4587) -> (-457.0796, 100)
  arc A106 (-457.0796, 306.4587) -> (-471.0796, 306.4587) centre (-464.0796, 306.4587) ccw
  line L271 (-457.0796, 306.4587) -> (-457.0796, 300)
  arc A107 (-457.0796, 506.4587) -> (-471.0796, 506.4587) centre (-464.0796, 506.4587) ccw construction
  line L272 (-457.0796, 506.4587) -> (-457.0796, 500) construction
  point P0 (158.3765, 0)
  point P1 (-148.021, 75)
  point P2 (-128.5398, 50)
  point P3 (-95.6611, 25)
  point P4 (-51.1799, 6.6987)
  point P5 (-155.8997, 93.3013)
  point P6 (-148.021, 275)
  point P7 (-128.5398, 250)
  point P8 (-95.6611, 225)
  point P9 (-51.1799, 206.6987)
  point P10 (-157.0796, 303.4587)
  point P11 (-157.0796, 200)
  point P12 (-171.0796, 303.4587)
  point P13 (-6, 188.1567)
  point P14 (-142.7917, 285.4273)
  point P15 (-148.021, 475)
  point P16 (-128.5398, 450)
  point P17 (-95.6611, 425)
  point P18 (-51.1799, 406.6987)
  point P19 (-157.0796, 503.4587)
  point P20 (-157.0796, 400)
  point P21 (-171.0796, 503.4587)
  point P22 (-6, 388.1567)
  point P23 (-142.7917, 485.4273)
  point P24 (-448.021, 75)
  point P25 (-428.5398, 50)
  point P26 (-395.6611, 25)
  point P27 (-351.1799, 6.6987)
  point P28 (-457.0796, 103.4587)
  point P29 (-457.0796, 0)
  point P30 (-471.0796, 103.4587)
  point P31 (-306, -11.8433)
  point P32 (-442.7917, 85.4273)
  point P33 (-448.021, 275)
  point P34 (-428.5398, 250)
  point P35 (-395.6611, 225)
  point P36 (-351.1799, 206.6987)
  point P37 (-457.0796, 303.4587)
  point P38 (-457.0796, 200)
  point P39 (-471.0796, 303.4587)
  point P40 (-306, 188.1567)
  point P41 (-442.7917, 285.4273)
  point P42 (-448.021, 475)
  point P43 (-428.5398, 450)
  point P44 (-395.6611, 425)
  point P45 (-351.1799, 406.6987)
  point P46 (-457.0796, 503.4587)
  point P47 (-457.0796, 400)
  point P48 (-471.0796, 503.4587)
  point P49 (-306, 388.1567)
  point P50 (-442.7917, 485.4273)
  point P51 (-421.2258, 50.7726)
  point P52 (-392.6255, 29.6644)
  point P53 (-346.6709, 11.6004)
  point P54 (-436.0267, 68.102)
  point P55 (-457.0796, 503.4587)
  point P56 (-504.6796, 390.1567)
  point P57 (-606, 188.1567)
  point P58 (-757.0796, 200)
  point P59 (-748.021, 275)
  point P60 (-728.5398, 250)
  point P61 (-757.0796, 303.4587)
  point P62 (-695.6611, 225)
  point P63 (-651.1799, 206.6987)
  point P64 (-742.7917, 285.4273)
  point P65 (-771.0796, 303.4587)
  point P66 (-804.6796, 190.1567)
  point P67 (-564.55, 188.1567)
  point P68 (-554.95, 190.1567)
  point P69 (-254.95, 390.1567)
  point P70 (-278.75, 12)
  dimension "d43" = 25.75
  dimension "diameter" = 100
  dimension "d8" = 26.1799
  dimension "d14" = 30
  dimension "d15" = 30
  dimension "d16" = 30
  dimension "d32" = 10.625
  dimension "d47" = 8
  dimension "d49" = 2
  dimension "d53" = 21.25
  dimension "d62" = 20.825
  dimension "d123" = 120
  dimension "d126" = 59.109
  dimension "d137" = 2
  dimension "d138" = 90
  dimension "d139" = 90
  dimension "d141" = 7.1
  dimension "d142" = 14
  dimension "d143" = 7.1
  dimension "d144" = 12
  dimension "d145" = 5
  dimension "d146" = 35
  dimension "d147" = 24
  dimension "hole" = 4
  dimension "d155" = 4
  dimension "d156" = 9
  dimension "d157" = 4
  dimension "d158" = 6
  dimension "d159" = 4
  dimension "d160" = 4
  dimension "d241" = 120.891
  dimension "d244" = 120
  dimension "d245" = 30
  dimension "d246" = 3
  dimension "d249" = 200
  dimension "d252" = 300
  dimension "d255" = 120
  dimension "d256" = 5.1701
  dimension "d259" = 0.5
  dimension "d260" = 0.5
  dimension "d261" = 120
  dimension "d262" = 120
  dimension "d264" = 5.1701
  dimension "d265" = 38
  dimension "d268" = 300
  dimension "d275" = 200
  dimension "d288" = 5.1701
  dimension "d289" = 5.1701
  dimension "d290" = 5.1701
  dimension "d291" = 5.1701
  dimension "d292" = 11.2
  dimension "d293" = 4
  dimension "d294" = 4
  dimension "d296" = 3
  dimension "d299" = 300
  dimension "d324" = 11.2
  dimension "d325" = 4
  dimension "d326" = 4
  dimension "d328" = 3
  dimension "d330" = 4
  dimension "d331" = 10
  dimension "d332" = 10
  dimension "d335" = 200
  dimension "d338" = 300
  dimension "d341" = 7.1
  dimension "d342" = 4.6
sketch "Sketch5" plane through (0, 0, 0) normal (0, 0, 1) x (1, 0, 0)
  circle A0 centre (-171.0796, 114.7323) radius 2
  arc A1 (-168.5126, 119.023) -> (-173.6466, 110.4415) centre (-171.0796, 114.7323) ccw construction
  line L0 (-173.6466, 110.4415) -> (-168.5126, 119.023) construction
  line L1 (-137.3368, 94.5451) -> (-171.0796, 114.7323) construction
  line L2 (-137.3368, 94.5451) -> (-143.2815, 84.6085) construction
  line L3 (-141.0754, 84.4005) -> (-135.6205, 93.5183) construction
  line L4 (-142.7917, 85.4273) -> (-141.0754, 84.4005) construction
  line L5 (-173.6466, 110.4415) -> (-138.1875, 89.2276) construction
  line L6 (-138.1875, 89.2276) -> (-133.0535, 97.8091)
  line L7 (-133.0535, 97.8091) -> (-168.5126, 119.023) construction
  line L8 (-159.6382, 113.7138) -> (-159.6382, 107.8873)
  line L9 (-159.6382, 107.8873) -> (-145.3456, 99.3365)
  line L10 (-133.0535, 97.8091) -> (-140.2116, 102.0915)
  line L11 (-152.4919, 103.6119) -> (-153.6918, 101.6062)
  line L12 (-140.2116, 102.0915) -> (-145.3456, 99.3365)
  line L13 (-159.6382, 113.7138) -> (-168.5126, 119.023)
  line L14 (-135.6205, 93.5183) -> (-169.3633, 113.7055) construction
  line L15 (-168.5126, 119.023) -> (-189.9664, 131.858)
  arc A2 (-189.9664, 131.858) -> (-195.1004, 123.2766) centre (-192.5334, 127.5673) ccw
  line L16 (-195.1004, 123.2766) -> (-173.6466, 110.4415)
  line L17 (-142.7917, 85.4273) -> (-141.0754, 84.4005)
  line L18 (-141.0754, 84.4005) -> (-138.1875, 89.2276)
  line L19 (-142.7917, 85.4273) -> (-142.6907, 91.9217)
  line L20 (-142.6907, 91.9217) -> (-173.6466, 110.4415)
  arc A3 (-141.0754, 84.4005) -> (-138.014, 141.6941) centre (-171.0796, 114.7323) ccw construction
  point P0 (0, 0)
  dimension "d346" = 4
  dimension "d347" = 3
  dimension "d356" = 25
  dimension "d357" = 120
extrude "Extrusion7" add sketch "Sketch3" along normal blind 3 contours L125 A106 L271 L174 L175 L176 L177 L178 L188 L191 A75 A58 L129 L131 L170 L137 L134 A60 L135 L136
sketch "Sketch6" plane through (0, 0, 0) normal (0, 0, -1) x (-1, 0, 0)
  line L0 (285.375, 188.1567) -> (285.375, 190.1567) projected
  line L1 (293.375, 188.1567) -> (293.375, 190.1567) projected
  arc A0 (293.375, 190.1567) -> (285.375, 190.1567) centre (289.375, 190.1567) ccw
  line L2 (285.375, 188.1567) -> (293.375, 188.1567)
  line L3 (495.0796, 188.1567) -> (264.55, 188.1567) projected
  point P0 (0, 0)
extrude "Extrusion8" cut sketch "Sketch6" against normal through all
properties part number "5linerail"
